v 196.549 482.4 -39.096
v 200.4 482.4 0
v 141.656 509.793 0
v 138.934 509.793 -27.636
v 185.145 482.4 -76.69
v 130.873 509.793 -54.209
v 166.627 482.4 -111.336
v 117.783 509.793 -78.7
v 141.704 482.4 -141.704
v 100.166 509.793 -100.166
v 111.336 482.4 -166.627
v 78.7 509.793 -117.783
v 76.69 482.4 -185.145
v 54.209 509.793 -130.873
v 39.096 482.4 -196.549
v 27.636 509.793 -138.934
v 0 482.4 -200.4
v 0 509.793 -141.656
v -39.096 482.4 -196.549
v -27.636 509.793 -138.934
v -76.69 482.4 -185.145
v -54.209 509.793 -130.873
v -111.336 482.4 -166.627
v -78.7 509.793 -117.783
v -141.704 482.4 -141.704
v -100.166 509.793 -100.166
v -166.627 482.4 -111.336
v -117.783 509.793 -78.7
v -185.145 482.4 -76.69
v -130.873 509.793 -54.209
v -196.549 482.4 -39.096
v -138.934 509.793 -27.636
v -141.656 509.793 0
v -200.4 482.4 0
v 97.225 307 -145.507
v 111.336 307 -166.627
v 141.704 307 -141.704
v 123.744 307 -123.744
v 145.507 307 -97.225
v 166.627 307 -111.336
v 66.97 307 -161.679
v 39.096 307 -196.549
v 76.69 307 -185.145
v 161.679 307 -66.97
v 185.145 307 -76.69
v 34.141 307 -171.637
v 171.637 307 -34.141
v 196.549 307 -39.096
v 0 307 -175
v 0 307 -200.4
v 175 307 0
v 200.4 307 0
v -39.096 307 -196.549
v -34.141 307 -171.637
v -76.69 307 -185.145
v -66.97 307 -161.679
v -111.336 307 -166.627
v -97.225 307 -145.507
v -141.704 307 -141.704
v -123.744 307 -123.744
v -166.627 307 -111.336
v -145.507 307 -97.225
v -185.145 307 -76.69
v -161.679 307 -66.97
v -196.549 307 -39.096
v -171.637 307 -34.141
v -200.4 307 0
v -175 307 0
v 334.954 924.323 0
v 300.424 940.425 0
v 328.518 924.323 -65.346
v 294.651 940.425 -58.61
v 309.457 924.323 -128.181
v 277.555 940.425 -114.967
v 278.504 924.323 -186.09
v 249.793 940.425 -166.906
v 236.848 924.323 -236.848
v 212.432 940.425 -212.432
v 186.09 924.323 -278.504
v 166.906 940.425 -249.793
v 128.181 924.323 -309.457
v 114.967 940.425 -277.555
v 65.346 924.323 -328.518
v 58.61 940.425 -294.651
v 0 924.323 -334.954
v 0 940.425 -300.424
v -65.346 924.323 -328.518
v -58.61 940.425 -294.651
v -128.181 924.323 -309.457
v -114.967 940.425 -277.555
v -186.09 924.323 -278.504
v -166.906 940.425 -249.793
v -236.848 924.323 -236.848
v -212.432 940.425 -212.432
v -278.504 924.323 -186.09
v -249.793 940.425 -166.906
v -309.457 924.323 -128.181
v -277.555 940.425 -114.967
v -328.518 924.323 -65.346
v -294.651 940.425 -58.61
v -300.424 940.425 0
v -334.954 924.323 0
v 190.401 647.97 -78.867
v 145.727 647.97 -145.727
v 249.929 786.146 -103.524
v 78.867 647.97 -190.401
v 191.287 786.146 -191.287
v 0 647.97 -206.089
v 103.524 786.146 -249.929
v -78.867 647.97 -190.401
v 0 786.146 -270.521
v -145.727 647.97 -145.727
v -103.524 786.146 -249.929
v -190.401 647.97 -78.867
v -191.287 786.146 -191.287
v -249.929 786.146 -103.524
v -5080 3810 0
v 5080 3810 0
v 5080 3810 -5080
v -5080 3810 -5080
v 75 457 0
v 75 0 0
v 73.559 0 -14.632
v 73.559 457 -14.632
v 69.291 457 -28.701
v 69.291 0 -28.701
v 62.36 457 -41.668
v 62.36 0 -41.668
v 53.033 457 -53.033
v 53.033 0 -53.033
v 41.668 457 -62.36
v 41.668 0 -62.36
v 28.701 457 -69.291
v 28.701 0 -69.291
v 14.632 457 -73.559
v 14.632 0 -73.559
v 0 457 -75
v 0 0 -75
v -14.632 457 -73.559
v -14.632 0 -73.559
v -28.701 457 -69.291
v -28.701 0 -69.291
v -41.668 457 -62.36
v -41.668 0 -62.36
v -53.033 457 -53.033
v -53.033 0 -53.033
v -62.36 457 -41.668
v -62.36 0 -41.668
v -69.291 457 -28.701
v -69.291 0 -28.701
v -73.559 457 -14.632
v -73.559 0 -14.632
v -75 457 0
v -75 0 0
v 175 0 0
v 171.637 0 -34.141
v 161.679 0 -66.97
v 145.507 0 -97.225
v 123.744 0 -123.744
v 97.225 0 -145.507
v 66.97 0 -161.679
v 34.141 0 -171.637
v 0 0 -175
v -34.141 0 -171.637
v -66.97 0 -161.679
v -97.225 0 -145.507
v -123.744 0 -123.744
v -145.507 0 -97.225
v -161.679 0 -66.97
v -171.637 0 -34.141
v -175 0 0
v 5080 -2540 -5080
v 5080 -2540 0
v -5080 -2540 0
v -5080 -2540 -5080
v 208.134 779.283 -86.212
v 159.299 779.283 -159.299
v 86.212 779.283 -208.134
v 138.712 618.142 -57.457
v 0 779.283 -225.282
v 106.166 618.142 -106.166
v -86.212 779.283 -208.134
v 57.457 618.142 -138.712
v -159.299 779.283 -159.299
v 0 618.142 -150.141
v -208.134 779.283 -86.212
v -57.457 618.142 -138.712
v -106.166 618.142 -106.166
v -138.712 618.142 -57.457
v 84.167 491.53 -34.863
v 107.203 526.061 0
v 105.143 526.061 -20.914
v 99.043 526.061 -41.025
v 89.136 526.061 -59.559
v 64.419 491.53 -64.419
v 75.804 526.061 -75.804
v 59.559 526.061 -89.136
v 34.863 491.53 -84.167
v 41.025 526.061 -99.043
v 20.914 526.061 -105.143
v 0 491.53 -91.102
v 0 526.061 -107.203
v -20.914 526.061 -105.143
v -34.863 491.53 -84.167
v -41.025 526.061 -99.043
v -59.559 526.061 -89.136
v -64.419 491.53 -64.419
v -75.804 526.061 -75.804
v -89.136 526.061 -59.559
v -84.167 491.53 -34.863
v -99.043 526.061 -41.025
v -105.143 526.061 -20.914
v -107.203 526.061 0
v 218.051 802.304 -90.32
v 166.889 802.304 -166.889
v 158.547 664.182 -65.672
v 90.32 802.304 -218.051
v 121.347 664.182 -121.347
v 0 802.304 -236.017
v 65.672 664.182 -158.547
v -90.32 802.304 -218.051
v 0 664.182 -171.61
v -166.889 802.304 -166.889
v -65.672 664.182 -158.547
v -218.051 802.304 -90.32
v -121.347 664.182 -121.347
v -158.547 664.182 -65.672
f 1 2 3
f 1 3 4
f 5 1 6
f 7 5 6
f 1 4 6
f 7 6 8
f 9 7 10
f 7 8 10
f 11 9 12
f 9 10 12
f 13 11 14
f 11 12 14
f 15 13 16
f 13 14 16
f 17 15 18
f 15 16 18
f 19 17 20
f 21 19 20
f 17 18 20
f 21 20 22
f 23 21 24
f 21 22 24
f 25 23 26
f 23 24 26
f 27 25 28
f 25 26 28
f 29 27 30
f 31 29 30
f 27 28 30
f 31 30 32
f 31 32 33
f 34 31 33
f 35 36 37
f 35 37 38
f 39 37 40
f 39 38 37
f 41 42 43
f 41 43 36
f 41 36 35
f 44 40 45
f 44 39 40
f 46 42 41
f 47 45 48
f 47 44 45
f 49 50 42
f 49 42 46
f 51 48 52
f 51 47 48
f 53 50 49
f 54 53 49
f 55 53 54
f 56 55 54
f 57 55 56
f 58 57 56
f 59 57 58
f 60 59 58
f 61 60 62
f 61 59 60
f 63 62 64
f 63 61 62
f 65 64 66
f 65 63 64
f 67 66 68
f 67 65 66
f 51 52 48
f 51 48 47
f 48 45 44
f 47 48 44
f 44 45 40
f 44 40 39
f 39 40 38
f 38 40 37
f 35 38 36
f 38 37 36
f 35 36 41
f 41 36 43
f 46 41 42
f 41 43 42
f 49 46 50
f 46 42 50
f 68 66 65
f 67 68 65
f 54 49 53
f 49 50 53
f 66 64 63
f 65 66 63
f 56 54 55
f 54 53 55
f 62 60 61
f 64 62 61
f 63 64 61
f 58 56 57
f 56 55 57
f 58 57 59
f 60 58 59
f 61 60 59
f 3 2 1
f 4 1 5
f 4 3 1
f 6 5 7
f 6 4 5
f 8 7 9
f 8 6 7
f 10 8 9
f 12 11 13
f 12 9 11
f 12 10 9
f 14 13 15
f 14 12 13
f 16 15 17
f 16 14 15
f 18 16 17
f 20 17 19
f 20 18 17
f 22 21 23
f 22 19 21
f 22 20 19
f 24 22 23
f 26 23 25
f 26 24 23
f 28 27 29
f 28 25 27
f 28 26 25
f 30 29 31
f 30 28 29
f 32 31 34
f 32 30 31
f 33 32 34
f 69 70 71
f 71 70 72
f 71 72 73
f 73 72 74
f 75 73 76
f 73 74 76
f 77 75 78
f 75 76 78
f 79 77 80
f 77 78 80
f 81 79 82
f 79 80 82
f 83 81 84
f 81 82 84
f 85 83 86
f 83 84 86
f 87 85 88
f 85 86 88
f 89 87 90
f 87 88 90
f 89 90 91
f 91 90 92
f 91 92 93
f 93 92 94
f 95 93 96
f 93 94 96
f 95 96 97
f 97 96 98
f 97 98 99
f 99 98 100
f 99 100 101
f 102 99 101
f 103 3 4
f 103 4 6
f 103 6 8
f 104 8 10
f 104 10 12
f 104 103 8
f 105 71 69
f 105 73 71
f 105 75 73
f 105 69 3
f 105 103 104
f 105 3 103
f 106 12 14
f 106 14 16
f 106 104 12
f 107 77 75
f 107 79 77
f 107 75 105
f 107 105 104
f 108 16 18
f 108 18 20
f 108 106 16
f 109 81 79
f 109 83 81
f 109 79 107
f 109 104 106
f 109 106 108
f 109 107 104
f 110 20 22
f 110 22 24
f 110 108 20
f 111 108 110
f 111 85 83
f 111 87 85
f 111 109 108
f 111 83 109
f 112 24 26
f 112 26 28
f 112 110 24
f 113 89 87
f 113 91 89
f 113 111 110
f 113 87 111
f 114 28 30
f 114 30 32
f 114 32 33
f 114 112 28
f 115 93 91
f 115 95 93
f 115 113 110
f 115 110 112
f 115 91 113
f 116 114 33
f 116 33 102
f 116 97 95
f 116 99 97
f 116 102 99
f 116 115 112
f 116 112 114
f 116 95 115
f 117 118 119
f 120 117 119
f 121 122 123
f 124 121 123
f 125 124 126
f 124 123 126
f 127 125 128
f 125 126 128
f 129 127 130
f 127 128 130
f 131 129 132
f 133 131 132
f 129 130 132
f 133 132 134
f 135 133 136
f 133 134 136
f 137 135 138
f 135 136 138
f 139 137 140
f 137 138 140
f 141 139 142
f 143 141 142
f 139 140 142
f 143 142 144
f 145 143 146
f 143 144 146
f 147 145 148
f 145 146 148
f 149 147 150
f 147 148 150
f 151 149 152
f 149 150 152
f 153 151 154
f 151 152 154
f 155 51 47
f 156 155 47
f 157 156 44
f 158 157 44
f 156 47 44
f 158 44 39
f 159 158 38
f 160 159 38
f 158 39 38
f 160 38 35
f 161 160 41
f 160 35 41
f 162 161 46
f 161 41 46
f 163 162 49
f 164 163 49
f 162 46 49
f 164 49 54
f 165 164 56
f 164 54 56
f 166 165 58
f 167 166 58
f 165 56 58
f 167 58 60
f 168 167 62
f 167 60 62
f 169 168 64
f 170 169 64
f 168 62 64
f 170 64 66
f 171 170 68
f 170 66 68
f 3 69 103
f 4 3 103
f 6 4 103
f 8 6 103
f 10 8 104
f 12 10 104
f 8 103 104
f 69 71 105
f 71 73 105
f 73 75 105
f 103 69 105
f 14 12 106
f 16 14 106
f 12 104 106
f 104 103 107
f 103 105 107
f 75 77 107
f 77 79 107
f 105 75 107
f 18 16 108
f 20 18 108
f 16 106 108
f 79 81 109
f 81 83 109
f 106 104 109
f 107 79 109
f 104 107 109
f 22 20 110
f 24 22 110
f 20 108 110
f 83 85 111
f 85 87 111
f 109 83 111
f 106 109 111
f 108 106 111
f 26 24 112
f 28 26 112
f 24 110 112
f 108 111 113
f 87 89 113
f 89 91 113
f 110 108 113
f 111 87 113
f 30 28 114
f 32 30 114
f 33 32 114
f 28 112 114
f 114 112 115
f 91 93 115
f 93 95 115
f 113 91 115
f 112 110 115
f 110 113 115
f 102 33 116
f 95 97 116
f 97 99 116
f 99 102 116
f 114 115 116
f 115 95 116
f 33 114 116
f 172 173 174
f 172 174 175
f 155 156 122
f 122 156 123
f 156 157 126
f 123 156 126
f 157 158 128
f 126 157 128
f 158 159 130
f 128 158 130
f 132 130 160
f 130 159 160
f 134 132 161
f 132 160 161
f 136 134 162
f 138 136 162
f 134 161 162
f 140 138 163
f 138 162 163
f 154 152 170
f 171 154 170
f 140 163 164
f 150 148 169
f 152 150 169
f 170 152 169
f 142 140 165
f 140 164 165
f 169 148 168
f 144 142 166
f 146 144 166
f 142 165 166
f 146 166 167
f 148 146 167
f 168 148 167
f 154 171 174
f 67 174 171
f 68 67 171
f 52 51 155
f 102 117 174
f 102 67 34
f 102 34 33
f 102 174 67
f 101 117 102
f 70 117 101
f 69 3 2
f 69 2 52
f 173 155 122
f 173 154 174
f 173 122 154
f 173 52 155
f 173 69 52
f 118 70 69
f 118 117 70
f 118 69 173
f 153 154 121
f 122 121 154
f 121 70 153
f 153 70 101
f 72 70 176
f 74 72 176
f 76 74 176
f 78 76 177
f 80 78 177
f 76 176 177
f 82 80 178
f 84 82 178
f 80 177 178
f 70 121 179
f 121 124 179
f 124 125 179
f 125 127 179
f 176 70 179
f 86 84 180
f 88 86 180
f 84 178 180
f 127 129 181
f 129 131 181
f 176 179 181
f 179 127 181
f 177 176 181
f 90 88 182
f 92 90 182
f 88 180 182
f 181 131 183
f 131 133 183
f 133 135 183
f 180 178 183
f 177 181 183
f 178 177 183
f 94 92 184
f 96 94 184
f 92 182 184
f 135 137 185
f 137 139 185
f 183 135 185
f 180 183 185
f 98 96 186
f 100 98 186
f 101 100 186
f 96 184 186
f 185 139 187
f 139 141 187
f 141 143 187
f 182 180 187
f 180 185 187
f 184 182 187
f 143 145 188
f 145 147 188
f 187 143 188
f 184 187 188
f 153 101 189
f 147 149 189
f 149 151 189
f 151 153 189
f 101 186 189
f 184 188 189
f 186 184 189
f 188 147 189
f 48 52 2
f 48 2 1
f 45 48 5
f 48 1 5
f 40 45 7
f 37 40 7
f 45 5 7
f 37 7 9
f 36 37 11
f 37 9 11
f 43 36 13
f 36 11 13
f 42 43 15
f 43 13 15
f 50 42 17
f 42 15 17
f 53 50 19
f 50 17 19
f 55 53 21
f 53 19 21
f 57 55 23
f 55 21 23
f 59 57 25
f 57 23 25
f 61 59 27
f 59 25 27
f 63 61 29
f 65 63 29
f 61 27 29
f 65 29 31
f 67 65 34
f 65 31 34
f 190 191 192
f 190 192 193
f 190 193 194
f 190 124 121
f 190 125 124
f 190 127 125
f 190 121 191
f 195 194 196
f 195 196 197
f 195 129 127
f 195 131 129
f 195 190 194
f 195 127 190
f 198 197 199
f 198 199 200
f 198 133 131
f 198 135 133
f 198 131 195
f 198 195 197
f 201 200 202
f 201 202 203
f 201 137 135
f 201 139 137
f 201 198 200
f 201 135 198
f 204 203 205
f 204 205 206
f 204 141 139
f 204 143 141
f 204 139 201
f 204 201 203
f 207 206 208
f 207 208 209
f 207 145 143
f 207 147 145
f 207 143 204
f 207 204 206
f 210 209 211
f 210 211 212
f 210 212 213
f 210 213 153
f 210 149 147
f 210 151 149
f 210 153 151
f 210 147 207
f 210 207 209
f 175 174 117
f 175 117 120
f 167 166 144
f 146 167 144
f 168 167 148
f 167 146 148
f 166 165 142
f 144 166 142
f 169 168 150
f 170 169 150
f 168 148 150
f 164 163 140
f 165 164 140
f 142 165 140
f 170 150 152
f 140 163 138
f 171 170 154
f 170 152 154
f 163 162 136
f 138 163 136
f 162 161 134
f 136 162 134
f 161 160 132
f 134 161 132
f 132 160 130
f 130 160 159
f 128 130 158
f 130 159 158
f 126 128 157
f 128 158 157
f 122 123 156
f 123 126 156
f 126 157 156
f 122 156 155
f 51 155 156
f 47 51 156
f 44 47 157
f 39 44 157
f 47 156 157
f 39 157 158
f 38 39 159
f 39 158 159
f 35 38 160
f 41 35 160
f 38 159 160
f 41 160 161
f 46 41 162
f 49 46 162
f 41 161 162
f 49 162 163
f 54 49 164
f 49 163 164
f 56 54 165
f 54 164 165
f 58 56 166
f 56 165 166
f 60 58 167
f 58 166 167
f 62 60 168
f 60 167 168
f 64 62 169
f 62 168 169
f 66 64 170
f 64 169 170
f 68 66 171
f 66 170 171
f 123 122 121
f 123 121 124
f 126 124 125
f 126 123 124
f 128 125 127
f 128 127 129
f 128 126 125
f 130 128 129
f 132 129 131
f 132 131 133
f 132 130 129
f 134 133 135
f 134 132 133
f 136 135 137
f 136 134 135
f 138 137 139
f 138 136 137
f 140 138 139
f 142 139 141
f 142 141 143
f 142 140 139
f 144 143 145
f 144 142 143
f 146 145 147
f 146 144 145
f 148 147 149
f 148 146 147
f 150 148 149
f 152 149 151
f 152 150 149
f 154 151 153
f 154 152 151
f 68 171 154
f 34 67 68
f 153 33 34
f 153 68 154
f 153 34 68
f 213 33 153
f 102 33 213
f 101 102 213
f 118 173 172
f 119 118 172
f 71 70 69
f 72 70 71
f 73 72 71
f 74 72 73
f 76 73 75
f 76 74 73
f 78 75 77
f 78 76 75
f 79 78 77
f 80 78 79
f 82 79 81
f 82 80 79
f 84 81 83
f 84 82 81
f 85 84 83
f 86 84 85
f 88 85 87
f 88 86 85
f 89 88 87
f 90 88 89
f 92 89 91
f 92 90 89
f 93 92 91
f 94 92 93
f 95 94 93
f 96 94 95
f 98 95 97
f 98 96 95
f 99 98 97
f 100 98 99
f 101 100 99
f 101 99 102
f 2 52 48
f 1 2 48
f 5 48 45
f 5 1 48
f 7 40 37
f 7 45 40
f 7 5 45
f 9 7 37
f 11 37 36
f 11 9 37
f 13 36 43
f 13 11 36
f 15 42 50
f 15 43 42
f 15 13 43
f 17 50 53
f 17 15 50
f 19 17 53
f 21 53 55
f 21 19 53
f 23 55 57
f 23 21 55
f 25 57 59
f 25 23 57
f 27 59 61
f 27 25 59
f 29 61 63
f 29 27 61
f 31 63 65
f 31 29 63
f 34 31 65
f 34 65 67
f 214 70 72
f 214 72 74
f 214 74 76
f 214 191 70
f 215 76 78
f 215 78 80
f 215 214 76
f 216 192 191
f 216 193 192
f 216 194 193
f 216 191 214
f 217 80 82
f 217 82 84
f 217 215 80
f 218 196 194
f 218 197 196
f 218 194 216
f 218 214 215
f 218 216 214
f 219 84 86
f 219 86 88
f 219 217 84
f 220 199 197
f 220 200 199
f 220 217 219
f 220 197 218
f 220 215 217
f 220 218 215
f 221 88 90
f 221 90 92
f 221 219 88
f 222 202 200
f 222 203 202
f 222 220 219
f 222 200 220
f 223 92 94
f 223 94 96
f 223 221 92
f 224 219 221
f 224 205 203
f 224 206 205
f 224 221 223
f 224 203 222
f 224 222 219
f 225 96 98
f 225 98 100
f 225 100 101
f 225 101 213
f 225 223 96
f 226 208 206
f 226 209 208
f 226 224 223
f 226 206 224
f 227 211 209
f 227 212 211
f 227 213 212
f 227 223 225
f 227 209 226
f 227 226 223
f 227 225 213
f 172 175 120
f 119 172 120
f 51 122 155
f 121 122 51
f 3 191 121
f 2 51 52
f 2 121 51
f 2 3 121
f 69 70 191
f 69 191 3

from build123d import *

# Parameters (mm, degrees)
SKETCH1_R           = 175
SKETCH1_R_2         = 75
BOSS_EXTRUDE1_DEPTH = 457
SKETCH3_W           = 10160
SKETCH3_H           = 6350
BOSS_EXTRUDE2_DEPTH = 5080
SKETCH4_W           = 13475.768327993
SKETCH4_H           = 8367.586519284
CUT_EXTRUDE1_DEPTH  = 8132.96778154


# Read off the part's stored shape, not the designer's step: Intersect1
with BuildPart() as part:
    # Sketch1 → Boss-Extrude1 (new body)
    with BuildSketch(Plane(origin=(0, 0, 0), x_dir=(1, 0, 0), z_dir=(0, 1, 0))):
        with Locations(Location((0, 0, 0), (0, 0, 270))):
            Circle(SKETCH1_R)
        with Locations(Location((0, 0, 0), (0, 0, 270))):
            Circle(SKETCH1_R_2, mode=Mode.SUBTRACT)
    extrude(amount=BOSS_EXTRUDE1_DEPTH)

    # Sketch2 → Revolve1 (revolve)
    with BuildSketch(Plane.XY, mode=Mode.PRIVATE) as revolve1_sk:
        Polygon((-175, 307), (-200.4, 307), (-200.4, 482.4), (-141.656158966, 509.792702943), (-334.953896668, 924.323380121), (-300.423535153, 940.425061203), (-107.203362165, 526.060723029), (-75, 457), (-175, 457), align=None)
    revolve(revolve1_sk.sketch.rotate(Axis((0, 0, 0), (0, 1, 0)), 270), axis=Axis((0, 0, 0), (0, 1, 0)))


with BuildPart() as body_2:
    # Sketch3 → Boss-Extrude2 (new, symmetric)
    with BuildSketch(Plane(origin=(0, 0, 0), x_dir=(0, 0, -1), z_dir=(1, 0, 0))):
        with Locations((0, 635)):
            Rectangle(SKETCH3_W, SKETCH3_H)
    extrude(amount=BOSS_EXTRUDE2_DEPTH, both=True)

    # Intersect1 outline → Intersect1 (revolve, cut)
    with BuildSketch(Plane.XY):
        Polygon((75, 457), (75, 0), (175, 0), (175, 307), (200.4, 307), (200.4, 482.4), (141.656158966, 509.792702943), (334.953896668, 924.323380121), (300.423535153, 940.425061203), align=None)
    revolve(axis=Axis((0, 0, 0), (0, 1, 0)), mode=Mode.SUBTRACT)


with BuildPart() as cut_extrude1_tool:
    # Sketch4 → Cut-Extrude1 (new, through all)
    with BuildSketch(Plane.XY):
        with Locations((454.179344916, 464.014834855)):
            Rectangle(SKETCH4_W, SKETCH4_H)
    extrude(amount=CUT_EXTRUDE1_DEPTH)


with BuildPart() as part_1:
    add(part.part)

    # Cut-Extrude1: cut by cut_extrude1_tool
    add(cut_extrude1_tool.part, mode=Mode.SUBTRACT)


with BuildPart() as body_2_1:
    add(body_2.part)

    # Cut-Extrude1: cut by cut_extrude1_tool
    add(cut_extrude1_tool.part, mode=Mode.SUBTRACT)


solid = Compound([part_1.part, body_2_1.part])
